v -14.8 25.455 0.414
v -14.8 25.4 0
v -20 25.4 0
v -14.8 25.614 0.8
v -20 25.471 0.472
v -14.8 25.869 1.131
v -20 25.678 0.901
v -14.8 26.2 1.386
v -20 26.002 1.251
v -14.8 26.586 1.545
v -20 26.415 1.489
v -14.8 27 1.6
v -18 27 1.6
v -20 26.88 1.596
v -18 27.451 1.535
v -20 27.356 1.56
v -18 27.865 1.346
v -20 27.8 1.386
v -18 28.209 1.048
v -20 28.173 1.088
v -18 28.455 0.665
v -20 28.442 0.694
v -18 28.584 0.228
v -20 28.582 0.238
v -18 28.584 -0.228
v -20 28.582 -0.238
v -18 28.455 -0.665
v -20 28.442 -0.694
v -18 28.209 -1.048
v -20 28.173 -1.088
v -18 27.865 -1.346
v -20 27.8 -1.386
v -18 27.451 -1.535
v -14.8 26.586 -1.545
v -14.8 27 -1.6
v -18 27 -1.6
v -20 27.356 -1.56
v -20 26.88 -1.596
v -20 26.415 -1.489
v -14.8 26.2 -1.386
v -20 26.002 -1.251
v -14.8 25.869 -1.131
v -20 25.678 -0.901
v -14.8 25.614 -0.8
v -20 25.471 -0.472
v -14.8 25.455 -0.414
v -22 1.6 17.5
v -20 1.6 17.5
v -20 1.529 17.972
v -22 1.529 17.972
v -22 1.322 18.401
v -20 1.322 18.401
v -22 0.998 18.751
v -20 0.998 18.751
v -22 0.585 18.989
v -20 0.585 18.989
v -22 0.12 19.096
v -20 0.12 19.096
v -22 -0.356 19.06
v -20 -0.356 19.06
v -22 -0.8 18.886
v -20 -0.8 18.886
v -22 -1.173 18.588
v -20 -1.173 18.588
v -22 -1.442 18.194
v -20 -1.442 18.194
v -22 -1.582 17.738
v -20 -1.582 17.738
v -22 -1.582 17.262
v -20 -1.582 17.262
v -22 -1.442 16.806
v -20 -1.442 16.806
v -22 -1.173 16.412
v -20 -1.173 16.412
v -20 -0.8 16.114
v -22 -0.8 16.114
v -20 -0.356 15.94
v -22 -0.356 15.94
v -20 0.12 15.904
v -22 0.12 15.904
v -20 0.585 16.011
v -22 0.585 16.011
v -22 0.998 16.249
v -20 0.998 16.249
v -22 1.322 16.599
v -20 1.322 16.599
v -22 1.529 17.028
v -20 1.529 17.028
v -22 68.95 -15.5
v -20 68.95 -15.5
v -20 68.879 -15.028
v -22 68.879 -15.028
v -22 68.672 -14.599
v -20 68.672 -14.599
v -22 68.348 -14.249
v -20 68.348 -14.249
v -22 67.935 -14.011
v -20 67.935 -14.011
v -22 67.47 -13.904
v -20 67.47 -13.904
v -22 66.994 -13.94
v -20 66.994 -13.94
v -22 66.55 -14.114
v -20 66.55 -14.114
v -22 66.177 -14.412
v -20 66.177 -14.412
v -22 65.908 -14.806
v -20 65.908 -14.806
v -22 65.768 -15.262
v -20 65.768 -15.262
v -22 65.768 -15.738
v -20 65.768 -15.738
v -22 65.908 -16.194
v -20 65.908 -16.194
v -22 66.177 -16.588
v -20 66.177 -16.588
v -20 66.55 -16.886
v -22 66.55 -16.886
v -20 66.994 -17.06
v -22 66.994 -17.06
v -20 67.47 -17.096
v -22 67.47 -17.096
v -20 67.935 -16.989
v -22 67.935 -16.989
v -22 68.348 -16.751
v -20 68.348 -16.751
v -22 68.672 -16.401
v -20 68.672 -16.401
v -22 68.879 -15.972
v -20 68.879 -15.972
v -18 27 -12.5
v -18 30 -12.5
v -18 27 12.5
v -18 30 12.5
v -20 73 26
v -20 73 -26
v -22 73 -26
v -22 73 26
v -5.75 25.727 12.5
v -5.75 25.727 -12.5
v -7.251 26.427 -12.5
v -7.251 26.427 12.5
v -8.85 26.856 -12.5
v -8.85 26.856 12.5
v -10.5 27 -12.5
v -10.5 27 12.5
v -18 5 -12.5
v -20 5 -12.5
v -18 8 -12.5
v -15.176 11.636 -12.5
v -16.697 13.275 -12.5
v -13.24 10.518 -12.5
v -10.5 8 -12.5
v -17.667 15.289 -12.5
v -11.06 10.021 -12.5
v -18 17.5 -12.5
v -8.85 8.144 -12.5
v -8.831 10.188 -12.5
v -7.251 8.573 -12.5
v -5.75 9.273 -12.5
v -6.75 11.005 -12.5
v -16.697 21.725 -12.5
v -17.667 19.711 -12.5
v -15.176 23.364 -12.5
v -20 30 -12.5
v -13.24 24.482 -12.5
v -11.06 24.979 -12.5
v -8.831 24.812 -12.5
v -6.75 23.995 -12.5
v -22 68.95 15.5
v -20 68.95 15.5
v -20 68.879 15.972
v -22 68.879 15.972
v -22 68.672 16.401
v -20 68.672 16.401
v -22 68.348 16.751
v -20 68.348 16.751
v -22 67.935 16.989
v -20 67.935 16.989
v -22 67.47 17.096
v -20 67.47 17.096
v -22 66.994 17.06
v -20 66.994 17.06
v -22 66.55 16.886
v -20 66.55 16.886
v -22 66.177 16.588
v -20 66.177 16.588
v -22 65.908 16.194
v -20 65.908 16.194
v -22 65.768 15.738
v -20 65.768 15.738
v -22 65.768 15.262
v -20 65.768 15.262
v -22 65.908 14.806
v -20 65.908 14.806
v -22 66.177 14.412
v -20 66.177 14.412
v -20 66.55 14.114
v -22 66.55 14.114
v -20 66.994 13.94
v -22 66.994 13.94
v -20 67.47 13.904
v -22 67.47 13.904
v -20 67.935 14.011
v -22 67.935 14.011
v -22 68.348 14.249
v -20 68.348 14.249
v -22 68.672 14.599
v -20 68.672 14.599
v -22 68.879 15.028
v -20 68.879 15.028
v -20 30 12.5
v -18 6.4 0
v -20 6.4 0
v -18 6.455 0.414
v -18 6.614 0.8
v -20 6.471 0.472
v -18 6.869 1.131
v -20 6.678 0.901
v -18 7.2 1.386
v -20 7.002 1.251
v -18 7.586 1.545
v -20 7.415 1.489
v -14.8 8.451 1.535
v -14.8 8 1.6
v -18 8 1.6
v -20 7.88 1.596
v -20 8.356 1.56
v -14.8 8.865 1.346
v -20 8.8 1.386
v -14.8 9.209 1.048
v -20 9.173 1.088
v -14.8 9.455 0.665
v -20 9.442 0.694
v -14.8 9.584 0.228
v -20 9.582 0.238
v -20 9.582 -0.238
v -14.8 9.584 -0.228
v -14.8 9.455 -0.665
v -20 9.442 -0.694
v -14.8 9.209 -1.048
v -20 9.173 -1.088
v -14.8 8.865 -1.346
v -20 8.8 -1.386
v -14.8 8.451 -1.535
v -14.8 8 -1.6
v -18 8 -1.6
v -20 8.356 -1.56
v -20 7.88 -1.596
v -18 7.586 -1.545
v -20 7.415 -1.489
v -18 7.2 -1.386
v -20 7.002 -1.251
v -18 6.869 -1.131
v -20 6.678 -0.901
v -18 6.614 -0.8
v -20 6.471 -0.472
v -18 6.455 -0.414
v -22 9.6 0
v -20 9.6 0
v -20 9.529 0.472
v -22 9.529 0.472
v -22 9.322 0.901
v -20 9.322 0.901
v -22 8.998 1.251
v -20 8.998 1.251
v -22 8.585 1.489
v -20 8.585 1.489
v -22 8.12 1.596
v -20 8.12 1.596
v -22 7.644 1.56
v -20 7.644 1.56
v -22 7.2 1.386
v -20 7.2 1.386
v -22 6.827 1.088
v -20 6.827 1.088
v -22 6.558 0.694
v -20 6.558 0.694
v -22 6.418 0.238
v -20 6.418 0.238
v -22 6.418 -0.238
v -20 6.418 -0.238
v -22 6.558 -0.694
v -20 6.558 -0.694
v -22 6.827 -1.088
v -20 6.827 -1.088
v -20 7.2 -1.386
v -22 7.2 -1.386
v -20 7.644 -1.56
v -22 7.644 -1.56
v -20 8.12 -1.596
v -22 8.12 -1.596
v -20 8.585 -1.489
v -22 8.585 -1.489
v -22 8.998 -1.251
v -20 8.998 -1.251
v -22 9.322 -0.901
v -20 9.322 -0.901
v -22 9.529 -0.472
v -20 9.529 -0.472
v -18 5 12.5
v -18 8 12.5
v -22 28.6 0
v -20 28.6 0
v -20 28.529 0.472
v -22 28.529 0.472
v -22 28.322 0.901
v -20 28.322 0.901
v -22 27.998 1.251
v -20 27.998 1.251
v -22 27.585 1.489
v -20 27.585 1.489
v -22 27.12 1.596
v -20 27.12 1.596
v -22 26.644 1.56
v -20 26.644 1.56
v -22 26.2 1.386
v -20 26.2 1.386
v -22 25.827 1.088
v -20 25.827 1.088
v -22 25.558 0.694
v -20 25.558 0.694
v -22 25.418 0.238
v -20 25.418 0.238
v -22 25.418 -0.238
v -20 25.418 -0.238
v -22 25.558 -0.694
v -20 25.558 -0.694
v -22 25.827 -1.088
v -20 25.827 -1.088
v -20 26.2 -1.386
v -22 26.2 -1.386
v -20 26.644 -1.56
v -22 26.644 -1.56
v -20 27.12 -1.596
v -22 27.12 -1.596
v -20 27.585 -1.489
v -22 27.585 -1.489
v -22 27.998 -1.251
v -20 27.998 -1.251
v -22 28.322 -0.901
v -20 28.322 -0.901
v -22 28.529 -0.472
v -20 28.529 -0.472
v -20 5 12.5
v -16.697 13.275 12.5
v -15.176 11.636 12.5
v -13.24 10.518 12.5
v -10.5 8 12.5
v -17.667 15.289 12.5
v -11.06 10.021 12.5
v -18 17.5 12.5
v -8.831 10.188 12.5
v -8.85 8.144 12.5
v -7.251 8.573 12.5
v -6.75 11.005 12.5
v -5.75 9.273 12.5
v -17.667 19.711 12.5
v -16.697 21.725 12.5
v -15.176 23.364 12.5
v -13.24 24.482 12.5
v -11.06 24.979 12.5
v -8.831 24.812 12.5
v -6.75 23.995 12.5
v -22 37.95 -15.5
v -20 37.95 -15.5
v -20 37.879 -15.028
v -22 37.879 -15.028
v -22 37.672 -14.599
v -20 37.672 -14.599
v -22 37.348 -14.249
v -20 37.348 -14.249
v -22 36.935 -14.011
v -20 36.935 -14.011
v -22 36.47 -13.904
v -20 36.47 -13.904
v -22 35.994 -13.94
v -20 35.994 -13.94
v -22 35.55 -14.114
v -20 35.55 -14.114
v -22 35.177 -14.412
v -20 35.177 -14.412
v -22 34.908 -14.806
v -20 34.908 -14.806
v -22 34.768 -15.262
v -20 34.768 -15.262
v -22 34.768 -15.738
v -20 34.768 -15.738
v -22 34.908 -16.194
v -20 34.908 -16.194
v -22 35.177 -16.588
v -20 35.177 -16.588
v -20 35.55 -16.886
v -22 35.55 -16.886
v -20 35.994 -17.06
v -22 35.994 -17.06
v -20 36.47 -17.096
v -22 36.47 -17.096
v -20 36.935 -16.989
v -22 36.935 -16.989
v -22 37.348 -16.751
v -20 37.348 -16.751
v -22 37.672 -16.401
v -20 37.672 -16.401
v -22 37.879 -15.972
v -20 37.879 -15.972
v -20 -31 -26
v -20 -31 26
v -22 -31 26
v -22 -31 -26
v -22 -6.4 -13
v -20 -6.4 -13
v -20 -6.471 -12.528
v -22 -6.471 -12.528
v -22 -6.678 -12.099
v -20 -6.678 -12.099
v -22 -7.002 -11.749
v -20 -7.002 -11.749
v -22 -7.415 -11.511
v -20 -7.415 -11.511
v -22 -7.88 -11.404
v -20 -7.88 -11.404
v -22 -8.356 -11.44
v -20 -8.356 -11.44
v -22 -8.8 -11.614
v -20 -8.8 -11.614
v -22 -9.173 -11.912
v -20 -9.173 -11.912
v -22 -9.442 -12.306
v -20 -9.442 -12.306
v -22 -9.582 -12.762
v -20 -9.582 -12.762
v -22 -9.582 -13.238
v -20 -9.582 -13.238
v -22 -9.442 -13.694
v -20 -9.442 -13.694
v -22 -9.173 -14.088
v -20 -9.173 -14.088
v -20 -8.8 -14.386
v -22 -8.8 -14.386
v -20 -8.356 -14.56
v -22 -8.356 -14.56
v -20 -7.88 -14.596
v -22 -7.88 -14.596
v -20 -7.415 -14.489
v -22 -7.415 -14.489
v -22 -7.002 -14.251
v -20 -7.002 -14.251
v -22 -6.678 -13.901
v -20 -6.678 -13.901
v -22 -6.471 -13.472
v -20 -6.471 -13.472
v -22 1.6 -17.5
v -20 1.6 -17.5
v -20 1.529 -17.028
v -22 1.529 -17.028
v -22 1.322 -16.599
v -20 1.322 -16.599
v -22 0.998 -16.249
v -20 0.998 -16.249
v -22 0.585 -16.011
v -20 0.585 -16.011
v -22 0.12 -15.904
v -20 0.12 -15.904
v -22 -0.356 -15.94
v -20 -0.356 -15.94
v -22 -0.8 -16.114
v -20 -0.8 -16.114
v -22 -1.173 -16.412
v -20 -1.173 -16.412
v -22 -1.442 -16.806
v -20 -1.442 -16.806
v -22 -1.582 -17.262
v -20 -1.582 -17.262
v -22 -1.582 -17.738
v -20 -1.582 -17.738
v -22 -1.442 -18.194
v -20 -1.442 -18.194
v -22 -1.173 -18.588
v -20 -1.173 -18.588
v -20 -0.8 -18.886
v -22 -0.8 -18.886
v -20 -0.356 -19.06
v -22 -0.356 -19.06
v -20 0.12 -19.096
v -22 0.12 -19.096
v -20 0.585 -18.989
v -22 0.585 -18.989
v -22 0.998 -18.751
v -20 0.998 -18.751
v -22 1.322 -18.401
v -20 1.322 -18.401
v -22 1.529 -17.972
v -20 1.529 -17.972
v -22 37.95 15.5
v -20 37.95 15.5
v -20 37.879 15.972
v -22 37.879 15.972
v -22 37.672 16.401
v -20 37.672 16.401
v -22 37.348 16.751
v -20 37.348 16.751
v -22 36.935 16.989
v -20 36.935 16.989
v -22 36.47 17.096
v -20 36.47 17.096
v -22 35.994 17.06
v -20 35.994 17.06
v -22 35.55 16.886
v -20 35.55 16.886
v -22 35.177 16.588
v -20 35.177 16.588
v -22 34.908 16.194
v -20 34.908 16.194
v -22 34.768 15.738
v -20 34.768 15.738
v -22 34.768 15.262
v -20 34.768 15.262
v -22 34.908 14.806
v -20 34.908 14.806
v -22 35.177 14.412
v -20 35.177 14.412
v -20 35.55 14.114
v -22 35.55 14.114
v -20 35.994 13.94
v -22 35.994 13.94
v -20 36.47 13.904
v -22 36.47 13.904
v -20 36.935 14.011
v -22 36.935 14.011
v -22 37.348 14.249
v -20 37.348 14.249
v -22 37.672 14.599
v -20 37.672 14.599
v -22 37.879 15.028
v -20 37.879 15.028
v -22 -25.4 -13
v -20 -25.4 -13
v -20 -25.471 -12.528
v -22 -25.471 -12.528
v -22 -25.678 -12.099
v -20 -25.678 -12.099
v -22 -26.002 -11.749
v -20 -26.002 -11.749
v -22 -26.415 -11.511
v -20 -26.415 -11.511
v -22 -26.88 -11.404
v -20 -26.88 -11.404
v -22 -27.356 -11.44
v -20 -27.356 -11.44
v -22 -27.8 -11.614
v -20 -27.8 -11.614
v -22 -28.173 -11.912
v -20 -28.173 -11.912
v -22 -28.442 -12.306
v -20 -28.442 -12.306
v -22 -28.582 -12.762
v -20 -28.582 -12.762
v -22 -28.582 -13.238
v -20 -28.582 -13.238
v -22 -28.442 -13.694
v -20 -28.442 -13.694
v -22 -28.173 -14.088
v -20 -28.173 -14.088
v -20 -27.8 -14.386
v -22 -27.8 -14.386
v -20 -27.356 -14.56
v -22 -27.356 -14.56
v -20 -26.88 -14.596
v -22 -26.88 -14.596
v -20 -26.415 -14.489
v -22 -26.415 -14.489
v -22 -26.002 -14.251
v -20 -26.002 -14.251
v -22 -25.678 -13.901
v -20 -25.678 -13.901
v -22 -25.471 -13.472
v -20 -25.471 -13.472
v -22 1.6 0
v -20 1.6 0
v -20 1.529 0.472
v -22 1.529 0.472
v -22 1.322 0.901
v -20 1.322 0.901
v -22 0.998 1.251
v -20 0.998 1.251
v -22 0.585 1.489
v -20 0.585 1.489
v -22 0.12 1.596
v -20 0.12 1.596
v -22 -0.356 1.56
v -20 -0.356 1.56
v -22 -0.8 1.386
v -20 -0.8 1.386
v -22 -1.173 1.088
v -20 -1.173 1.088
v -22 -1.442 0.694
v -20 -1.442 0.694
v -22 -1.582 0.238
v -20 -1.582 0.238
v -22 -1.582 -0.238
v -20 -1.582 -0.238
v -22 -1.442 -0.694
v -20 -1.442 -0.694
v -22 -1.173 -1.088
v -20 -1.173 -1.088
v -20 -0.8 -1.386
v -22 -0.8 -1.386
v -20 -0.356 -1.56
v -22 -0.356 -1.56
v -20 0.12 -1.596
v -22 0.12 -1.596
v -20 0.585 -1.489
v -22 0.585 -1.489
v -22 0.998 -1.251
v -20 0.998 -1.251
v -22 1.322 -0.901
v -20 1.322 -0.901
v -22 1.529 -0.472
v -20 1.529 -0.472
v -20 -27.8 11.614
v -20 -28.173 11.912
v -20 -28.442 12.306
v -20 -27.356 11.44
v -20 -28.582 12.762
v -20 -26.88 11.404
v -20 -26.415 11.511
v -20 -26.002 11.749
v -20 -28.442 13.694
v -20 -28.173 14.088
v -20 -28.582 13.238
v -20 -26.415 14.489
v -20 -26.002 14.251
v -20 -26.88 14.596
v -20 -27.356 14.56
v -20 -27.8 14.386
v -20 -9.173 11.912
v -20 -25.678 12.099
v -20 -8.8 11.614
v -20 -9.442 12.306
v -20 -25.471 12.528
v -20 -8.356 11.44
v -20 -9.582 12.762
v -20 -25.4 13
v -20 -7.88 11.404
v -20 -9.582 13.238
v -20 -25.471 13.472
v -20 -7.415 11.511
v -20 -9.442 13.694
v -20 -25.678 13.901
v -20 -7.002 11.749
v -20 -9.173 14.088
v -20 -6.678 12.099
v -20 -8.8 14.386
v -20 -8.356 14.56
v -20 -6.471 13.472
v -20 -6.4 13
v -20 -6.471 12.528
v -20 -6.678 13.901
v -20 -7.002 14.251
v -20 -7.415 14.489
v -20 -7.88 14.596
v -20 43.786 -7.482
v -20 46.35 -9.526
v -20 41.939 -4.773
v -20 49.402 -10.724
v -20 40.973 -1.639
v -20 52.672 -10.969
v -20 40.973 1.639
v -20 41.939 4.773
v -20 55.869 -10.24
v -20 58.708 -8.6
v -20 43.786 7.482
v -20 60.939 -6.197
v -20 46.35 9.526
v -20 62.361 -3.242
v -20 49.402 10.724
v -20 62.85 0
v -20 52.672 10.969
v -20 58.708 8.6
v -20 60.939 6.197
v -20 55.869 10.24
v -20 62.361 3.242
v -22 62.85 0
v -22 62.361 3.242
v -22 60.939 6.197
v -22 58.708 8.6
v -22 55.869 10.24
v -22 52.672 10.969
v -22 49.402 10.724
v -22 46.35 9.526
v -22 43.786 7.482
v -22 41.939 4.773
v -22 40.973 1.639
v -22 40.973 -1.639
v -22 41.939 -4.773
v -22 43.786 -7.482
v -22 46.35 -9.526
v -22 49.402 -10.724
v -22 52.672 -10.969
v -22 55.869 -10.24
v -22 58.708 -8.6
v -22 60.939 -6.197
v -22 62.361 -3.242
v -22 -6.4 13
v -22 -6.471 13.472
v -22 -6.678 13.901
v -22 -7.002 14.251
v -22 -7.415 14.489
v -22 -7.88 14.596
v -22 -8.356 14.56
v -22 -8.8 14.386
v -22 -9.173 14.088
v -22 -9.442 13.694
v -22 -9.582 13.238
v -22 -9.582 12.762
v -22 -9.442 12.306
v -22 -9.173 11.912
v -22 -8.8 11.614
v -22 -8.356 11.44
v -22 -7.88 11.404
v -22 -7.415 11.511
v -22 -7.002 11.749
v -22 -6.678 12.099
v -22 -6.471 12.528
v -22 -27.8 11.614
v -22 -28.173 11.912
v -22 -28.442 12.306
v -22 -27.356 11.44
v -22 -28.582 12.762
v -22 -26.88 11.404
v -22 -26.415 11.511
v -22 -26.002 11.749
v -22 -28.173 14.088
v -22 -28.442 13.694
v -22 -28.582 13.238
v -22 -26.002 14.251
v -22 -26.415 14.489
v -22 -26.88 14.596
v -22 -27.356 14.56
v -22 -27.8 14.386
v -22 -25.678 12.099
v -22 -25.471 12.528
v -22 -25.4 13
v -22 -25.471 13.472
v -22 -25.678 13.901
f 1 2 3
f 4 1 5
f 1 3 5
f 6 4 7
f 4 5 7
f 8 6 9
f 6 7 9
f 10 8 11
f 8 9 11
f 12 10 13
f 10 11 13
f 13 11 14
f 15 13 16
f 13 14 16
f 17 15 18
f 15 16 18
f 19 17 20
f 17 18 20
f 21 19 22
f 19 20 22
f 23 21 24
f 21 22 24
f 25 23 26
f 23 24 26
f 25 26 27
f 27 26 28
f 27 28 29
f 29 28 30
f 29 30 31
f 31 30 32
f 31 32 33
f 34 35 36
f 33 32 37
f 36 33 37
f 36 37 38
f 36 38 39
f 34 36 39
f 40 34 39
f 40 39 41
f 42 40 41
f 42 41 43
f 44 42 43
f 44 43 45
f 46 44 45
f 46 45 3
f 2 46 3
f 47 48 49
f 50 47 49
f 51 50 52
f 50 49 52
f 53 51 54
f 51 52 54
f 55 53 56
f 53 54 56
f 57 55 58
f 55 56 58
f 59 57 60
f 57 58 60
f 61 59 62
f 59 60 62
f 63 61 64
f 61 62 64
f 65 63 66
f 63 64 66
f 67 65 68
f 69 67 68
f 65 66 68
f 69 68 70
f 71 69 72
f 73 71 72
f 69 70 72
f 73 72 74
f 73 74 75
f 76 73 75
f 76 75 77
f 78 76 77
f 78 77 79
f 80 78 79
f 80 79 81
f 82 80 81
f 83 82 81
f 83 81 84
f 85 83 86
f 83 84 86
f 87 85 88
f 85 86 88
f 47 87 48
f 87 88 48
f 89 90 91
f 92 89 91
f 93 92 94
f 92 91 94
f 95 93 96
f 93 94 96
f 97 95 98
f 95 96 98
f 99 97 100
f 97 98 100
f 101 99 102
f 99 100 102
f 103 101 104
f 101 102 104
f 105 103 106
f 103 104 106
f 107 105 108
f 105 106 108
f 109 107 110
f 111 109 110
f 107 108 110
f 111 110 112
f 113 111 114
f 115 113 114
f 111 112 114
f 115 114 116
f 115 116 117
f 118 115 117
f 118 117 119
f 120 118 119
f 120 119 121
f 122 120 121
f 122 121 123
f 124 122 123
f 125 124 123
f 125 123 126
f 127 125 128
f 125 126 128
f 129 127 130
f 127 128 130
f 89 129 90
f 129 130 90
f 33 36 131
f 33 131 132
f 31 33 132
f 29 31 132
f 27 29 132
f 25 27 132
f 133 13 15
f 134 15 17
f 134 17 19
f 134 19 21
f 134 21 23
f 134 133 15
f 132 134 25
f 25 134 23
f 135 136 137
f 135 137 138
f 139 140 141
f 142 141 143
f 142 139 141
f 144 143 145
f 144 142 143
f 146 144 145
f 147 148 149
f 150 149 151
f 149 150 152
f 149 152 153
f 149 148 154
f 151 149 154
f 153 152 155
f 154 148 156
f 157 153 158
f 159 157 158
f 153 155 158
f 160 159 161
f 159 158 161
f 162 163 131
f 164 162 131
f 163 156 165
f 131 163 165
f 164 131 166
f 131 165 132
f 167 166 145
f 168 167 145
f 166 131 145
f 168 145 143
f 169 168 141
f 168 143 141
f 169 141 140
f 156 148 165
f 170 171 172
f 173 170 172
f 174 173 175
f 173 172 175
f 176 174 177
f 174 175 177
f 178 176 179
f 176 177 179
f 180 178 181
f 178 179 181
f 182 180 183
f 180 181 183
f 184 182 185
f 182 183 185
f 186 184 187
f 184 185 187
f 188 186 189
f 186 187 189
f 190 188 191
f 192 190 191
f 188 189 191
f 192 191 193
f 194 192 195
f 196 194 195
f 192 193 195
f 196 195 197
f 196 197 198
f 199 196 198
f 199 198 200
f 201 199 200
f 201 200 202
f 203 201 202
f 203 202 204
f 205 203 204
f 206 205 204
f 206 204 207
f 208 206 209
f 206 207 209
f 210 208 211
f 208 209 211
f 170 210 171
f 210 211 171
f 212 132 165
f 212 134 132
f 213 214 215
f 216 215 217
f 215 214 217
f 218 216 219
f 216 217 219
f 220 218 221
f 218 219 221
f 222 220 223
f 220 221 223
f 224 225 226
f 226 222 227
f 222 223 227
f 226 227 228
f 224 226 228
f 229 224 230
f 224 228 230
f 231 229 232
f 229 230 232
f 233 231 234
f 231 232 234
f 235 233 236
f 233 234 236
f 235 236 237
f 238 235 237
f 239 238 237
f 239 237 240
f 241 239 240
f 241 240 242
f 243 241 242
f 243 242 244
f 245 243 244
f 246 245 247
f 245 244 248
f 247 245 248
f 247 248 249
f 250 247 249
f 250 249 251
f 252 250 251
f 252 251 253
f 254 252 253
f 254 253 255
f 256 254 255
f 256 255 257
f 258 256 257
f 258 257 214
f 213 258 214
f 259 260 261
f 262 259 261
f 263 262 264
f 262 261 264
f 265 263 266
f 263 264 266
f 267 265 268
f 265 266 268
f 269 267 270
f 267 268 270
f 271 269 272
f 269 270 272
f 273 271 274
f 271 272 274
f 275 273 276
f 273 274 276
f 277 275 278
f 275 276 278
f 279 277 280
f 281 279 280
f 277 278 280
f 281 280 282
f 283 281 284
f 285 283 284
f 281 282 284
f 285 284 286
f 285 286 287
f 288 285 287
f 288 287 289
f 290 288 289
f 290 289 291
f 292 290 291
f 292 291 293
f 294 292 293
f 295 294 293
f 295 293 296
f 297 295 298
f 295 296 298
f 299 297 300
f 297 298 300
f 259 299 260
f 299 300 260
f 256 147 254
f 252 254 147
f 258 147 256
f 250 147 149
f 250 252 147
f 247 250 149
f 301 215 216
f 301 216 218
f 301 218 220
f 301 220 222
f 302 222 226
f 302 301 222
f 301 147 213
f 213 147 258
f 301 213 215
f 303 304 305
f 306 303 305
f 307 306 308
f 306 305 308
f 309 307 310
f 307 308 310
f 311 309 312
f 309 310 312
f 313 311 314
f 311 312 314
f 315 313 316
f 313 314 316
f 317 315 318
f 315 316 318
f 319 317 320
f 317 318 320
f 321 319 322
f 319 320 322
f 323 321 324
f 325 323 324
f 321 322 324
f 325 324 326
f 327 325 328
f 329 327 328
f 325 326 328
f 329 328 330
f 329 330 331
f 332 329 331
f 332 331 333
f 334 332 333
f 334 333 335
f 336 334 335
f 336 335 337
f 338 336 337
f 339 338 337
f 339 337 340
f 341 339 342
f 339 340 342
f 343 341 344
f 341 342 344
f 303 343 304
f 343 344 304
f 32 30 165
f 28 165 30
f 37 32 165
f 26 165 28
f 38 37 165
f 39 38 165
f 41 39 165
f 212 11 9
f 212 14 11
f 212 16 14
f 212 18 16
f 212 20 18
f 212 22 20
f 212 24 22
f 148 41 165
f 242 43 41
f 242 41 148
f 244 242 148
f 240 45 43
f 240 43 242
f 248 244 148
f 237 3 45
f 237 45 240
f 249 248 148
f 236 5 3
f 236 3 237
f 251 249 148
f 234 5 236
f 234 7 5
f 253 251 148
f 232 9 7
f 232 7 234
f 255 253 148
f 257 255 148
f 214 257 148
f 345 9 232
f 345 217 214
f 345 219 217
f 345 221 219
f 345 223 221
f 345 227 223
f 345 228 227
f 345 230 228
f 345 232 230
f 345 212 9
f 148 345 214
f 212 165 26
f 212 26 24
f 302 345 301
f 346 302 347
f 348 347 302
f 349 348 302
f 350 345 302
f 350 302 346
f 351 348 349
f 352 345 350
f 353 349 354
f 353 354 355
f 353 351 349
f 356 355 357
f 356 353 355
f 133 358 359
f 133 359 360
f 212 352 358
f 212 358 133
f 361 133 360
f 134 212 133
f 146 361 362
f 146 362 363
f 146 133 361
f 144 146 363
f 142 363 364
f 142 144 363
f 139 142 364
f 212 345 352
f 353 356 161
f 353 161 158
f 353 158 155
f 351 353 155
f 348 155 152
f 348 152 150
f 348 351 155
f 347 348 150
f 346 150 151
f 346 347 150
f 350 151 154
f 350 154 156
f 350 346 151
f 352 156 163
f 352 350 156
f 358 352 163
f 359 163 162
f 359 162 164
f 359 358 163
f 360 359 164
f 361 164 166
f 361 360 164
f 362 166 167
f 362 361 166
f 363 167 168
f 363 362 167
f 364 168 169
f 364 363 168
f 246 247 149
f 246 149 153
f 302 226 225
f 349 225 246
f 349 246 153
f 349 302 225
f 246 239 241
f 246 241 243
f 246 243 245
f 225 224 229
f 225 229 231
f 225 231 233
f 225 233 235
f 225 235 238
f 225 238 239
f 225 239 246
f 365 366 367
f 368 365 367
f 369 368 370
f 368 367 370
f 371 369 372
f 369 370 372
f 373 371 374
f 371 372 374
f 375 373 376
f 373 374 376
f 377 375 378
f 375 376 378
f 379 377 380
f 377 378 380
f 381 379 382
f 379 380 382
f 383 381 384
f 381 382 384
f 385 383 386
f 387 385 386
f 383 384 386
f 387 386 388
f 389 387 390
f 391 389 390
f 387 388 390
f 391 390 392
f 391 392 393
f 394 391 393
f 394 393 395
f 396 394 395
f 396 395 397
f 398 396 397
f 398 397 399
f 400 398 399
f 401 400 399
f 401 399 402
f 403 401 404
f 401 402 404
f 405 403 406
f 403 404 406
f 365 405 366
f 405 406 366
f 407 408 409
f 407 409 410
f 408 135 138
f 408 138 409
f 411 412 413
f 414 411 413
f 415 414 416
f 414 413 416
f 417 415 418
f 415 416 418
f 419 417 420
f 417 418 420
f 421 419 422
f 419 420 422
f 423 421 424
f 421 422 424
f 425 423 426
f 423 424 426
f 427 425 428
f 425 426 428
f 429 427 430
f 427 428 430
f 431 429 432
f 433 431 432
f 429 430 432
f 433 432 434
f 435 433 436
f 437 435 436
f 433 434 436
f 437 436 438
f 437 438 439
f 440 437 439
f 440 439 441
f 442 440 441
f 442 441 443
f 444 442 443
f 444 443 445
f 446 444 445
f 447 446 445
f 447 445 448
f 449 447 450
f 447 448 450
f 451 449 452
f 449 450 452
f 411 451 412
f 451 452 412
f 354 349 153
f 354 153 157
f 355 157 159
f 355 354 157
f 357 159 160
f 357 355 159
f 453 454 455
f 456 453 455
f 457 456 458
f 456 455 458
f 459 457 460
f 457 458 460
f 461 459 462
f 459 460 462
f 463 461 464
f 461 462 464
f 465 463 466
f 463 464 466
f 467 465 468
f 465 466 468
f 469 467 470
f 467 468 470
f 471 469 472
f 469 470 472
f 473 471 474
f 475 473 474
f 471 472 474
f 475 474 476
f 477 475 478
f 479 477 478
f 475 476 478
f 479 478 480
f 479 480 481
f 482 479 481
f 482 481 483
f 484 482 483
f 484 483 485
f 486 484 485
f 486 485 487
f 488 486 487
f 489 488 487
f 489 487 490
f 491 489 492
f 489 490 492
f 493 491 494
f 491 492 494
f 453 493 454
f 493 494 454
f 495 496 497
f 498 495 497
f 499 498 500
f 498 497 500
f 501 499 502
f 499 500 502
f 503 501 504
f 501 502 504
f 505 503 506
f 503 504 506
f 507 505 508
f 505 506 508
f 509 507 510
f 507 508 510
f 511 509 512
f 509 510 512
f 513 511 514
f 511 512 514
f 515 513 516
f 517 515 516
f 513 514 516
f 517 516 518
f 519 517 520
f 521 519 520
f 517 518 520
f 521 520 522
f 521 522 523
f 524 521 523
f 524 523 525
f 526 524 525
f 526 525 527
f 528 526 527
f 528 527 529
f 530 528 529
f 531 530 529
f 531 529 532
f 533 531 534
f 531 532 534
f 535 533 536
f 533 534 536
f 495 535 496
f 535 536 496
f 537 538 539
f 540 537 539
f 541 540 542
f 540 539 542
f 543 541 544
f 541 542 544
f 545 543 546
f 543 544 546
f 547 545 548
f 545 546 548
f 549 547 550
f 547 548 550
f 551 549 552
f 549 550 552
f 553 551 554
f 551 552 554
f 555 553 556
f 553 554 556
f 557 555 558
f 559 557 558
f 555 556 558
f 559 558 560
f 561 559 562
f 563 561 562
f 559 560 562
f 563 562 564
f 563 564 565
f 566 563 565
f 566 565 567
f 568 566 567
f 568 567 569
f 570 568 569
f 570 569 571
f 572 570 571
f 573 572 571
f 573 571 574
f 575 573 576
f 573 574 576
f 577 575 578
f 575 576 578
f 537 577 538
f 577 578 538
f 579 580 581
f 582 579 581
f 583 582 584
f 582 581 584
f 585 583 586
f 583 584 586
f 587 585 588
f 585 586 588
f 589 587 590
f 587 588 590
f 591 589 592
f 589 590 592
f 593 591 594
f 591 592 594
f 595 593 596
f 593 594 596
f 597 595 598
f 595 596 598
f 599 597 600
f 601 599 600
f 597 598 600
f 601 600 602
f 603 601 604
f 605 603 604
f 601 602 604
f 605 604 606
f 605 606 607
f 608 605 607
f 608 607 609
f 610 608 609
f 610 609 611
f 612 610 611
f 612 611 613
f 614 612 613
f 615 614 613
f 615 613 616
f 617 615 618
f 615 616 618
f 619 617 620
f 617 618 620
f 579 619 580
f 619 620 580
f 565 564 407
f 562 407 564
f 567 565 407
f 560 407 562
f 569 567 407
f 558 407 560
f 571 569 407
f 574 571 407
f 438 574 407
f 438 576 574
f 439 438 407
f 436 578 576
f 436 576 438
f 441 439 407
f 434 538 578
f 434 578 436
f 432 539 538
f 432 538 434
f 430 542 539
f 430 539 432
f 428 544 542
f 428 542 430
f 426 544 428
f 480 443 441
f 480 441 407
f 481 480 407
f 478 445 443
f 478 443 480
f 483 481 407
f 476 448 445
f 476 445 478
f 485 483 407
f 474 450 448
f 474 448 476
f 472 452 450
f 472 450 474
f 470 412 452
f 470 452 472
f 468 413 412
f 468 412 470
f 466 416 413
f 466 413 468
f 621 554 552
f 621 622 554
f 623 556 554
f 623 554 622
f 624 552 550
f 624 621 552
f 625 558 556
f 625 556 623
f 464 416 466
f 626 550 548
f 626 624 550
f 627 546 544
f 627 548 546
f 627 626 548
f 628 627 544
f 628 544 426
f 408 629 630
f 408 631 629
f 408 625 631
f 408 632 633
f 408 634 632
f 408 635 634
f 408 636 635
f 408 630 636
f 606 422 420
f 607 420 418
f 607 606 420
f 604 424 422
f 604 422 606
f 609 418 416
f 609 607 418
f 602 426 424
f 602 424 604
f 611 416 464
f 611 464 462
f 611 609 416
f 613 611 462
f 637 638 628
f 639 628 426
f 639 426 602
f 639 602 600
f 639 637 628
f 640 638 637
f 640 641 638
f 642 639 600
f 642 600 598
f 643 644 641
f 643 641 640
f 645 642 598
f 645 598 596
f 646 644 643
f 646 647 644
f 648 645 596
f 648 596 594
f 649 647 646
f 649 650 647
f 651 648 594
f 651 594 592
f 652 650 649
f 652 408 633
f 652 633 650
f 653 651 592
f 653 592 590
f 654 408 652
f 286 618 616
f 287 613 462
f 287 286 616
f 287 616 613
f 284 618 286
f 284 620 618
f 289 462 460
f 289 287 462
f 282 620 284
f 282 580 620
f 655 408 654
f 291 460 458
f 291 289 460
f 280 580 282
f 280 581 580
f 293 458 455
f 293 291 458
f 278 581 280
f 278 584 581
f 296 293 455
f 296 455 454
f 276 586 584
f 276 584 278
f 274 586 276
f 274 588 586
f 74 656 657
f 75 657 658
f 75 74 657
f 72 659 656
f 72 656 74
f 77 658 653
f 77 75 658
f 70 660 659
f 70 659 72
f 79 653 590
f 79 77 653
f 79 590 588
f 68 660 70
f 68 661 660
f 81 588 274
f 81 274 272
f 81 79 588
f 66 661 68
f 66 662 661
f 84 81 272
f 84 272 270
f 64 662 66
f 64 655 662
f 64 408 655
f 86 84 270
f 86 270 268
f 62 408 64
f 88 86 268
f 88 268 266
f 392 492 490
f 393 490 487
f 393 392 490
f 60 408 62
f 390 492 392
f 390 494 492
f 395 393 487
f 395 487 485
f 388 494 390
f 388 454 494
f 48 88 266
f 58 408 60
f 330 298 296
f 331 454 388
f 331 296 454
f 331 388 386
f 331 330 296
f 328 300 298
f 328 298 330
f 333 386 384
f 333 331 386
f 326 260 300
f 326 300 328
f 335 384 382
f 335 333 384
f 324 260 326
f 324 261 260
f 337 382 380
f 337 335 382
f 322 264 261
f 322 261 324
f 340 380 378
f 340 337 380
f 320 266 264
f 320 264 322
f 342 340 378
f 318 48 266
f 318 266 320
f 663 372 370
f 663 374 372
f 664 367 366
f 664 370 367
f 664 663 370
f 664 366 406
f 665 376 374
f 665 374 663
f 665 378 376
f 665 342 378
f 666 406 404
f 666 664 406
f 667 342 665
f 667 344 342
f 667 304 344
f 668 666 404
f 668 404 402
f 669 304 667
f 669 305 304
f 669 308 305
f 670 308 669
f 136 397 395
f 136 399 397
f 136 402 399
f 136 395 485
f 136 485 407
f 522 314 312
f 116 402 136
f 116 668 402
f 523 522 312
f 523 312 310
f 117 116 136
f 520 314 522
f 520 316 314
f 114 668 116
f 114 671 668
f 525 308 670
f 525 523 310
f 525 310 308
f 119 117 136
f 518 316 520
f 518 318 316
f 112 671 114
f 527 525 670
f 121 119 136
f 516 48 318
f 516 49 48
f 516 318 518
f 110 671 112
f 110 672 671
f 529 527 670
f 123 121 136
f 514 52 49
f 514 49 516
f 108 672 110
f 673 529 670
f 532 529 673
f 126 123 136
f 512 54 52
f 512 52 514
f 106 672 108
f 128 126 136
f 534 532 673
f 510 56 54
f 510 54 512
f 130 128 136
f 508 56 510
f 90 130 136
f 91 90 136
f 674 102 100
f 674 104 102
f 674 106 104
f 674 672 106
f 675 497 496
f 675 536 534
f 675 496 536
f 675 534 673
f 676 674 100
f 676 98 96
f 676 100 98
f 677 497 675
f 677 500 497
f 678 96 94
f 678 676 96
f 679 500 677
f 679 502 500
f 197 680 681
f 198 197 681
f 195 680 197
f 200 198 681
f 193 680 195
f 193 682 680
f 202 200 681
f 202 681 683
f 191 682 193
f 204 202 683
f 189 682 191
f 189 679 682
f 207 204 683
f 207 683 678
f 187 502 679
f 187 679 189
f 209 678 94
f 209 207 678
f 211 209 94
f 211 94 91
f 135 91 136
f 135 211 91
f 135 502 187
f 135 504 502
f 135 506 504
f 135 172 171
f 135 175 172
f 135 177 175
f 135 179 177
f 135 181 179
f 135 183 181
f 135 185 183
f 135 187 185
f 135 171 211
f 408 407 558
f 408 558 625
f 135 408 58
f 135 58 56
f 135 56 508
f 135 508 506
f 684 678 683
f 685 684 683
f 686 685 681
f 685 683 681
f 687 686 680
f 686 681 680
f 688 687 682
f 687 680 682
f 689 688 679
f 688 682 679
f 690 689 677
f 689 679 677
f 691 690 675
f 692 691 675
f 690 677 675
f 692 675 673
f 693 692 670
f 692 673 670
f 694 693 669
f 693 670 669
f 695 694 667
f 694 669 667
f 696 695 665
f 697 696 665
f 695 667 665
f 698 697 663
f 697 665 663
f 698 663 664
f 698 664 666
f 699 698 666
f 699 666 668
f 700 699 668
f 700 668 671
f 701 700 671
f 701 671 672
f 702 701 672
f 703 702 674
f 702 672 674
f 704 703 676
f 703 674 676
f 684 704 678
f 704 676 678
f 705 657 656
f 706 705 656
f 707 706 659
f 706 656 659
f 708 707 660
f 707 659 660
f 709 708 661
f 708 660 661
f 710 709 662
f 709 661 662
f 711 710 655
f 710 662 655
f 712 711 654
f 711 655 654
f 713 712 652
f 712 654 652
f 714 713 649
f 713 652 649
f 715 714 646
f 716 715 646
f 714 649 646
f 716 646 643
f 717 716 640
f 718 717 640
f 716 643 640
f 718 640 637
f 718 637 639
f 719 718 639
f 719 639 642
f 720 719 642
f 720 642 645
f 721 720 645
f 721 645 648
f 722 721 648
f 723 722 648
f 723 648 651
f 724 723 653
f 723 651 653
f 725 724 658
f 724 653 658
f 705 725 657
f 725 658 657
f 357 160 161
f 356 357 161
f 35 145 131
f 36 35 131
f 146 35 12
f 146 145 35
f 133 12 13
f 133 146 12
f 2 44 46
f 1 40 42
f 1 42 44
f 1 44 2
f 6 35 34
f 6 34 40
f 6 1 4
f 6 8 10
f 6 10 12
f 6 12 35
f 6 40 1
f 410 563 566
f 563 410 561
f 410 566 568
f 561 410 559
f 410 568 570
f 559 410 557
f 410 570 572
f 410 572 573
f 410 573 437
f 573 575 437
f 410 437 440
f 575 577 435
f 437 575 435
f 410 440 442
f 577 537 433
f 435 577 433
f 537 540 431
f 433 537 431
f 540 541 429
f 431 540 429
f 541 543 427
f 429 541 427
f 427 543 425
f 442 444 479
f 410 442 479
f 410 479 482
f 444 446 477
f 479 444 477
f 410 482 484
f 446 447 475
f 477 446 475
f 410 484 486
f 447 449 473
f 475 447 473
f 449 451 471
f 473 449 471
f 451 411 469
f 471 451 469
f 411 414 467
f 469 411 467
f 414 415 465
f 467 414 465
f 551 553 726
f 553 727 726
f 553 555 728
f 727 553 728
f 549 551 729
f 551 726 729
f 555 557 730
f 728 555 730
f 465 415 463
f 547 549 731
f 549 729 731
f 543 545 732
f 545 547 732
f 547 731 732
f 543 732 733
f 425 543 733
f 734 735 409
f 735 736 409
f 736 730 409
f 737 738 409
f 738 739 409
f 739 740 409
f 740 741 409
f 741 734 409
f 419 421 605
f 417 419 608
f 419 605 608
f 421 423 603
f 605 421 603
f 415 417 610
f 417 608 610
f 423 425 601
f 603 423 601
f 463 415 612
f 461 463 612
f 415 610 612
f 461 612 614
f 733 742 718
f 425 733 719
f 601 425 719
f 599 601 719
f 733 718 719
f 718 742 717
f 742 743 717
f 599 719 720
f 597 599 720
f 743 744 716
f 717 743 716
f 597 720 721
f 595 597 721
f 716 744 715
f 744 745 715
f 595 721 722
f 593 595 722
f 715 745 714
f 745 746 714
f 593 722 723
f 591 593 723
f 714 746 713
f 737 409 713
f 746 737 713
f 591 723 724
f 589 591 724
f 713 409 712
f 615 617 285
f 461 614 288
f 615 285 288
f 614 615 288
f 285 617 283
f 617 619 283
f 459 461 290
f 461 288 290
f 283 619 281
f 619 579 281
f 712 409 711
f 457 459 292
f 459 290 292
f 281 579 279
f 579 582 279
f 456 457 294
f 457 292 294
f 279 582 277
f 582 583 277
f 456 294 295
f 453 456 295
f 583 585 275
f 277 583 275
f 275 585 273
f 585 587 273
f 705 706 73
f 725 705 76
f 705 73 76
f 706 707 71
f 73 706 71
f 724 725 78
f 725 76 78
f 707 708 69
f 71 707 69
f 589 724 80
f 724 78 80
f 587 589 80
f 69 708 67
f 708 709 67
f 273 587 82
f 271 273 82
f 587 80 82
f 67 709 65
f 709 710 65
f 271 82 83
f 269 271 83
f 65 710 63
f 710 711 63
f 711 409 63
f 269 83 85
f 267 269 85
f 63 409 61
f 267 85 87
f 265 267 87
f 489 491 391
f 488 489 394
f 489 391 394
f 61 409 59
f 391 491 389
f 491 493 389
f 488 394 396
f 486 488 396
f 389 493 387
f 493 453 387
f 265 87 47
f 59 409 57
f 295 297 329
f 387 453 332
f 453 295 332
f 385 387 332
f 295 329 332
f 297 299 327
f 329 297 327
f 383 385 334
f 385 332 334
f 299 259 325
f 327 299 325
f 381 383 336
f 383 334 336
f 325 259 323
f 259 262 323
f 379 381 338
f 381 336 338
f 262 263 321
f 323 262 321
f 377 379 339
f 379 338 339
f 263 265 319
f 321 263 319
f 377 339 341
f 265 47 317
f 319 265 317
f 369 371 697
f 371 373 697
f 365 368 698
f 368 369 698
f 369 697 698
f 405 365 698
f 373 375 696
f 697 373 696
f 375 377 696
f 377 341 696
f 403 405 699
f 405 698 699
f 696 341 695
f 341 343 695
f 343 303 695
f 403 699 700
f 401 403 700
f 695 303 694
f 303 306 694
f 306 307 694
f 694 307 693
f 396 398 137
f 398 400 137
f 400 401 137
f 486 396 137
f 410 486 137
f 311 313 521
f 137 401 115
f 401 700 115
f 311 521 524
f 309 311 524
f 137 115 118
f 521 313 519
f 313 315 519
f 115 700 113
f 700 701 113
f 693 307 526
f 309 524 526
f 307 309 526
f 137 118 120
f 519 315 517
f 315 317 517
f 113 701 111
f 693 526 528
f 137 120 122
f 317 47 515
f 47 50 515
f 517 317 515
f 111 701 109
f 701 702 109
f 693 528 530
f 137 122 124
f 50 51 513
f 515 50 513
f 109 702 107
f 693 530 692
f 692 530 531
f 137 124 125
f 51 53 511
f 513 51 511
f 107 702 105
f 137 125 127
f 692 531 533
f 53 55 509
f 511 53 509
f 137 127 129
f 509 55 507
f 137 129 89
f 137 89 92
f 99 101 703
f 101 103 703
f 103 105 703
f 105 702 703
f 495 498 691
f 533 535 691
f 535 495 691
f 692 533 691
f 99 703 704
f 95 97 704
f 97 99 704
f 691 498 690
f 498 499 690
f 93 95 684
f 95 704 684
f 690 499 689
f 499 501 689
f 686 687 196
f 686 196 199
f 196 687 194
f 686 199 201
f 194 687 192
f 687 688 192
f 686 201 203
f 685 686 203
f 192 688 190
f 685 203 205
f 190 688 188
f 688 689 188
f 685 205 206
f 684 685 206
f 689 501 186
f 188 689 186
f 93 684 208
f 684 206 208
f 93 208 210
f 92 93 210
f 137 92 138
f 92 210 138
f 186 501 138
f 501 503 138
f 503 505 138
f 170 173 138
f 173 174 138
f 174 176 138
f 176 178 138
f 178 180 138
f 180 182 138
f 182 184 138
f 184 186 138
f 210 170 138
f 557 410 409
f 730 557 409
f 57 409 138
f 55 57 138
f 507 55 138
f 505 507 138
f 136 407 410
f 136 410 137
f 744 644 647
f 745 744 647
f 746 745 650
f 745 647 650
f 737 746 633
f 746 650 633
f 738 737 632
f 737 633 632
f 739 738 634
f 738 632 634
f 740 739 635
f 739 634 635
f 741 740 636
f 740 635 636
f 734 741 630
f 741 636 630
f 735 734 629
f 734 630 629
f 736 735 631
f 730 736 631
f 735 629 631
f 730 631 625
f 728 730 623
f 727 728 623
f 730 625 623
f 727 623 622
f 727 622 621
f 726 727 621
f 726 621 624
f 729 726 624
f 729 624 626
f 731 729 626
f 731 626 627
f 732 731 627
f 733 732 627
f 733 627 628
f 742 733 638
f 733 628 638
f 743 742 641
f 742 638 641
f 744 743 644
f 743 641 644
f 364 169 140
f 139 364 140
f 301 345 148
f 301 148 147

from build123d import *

# Parameters (mm, degrees)
F5_DEPTH = 12.5
F6_R     = 1.6
F7_DEPTH = 5.2
F4_R     = 1.6
F4_R_2   = 11
F8_DEPTH = 2


with BuildPart() as f5:
    # F1 (on Top) → F5 (new body, symmetric)
    with BuildSketch(Plane.XY):
        with BuildLine():
            Line((-20, 30), (-20, 17.5))
            Line((-20, 17.5), (-20, 5))
            Line((-20, 5), (-18, 5))
            Line((-18, 5), (-18, 8))
            Line((-18, 8), (-10.5, 8))
            ThreePointArc((-10.5, 8), (-8.0412190715, 8.3237046503), (-5.75, 9.272758664))
            Line((-5.75, 9.272758664), (-6.75, 11.0048094716))
            ThreePointArc((-6.75, 11.0048094716), (-14.25, 11.0048094716), (-18, 17.5))
            ThreePointArc((-18, 17.5), (-14.25, 23.9951905284), (-6.75, 23.9951905284))
            Line((-6.75, 23.9951905284), (-5.75, 25.727241336))
            ThreePointArc((-5.75, 25.727241336), (-8.0412190715, 26.6762953497), (-10.5, 27))
            Line((-10.5, 27), (-18, 27))
            Line((-18, 27), (-18, 30))
            Line((-18, 30), (-20, 30))
        make_face()
    extrude(amount=F5_DEPTH, both=True)

    # F6 (on face) → F7 (cut)
    with BuildSketch(Plane(origin=(-20, 0, 0), x_dir=(0, -1, 0), z_dir=(-1, 0, 0))):
        with Locations((-27, 0)):
            Circle(F6_R)
        with Locations((-8, 0)):
            Circle(F6_R)
    extrude(amount=-F7_DEPTH, mode=Mode.SUBTRACT)


with BuildPart() as f8:
    # F4 (on line) → F8 (new body)
    with BuildSketch(Plane.YZ.offset(-20)):
        Polygon((30, 26), (-30, 26), (-31, 26), (-31, -26), (-30, -26), (30, -26), (73, -26), (73, 26), align=None)
        with Locations((0, -17.5)):
            Circle(F4_R, mode=Mode.SUBTRACT)
        with Locations((-27, -13)):
            Circle(F4_R, mode=Mode.SUBTRACT)
        with Locations((-8, -13)):
            Circle(F4_R, mode=Mode.SUBTRACT)
        with Locations((36.35, -15.5)):
            Circle(F4_R, mode=Mode.SUBTRACT)
        with Locations((67.35, -15.5)):
            Circle(F4_R, mode=Mode.SUBTRACT)
        Circle(F4_R, mode=Mode.SUBTRACT)
        with Locations((8, 0)):
            Circle(F4_R, mode=Mode.SUBTRACT)
        with Locations((-27, 13)):
            Circle(F4_R, mode=Mode.SUBTRACT)
        with Locations((-8, 13)):
            Circle(F4_R, mode=Mode.SUBTRACT)
        with Locations((0, 17.5)):
            Circle(F4_R, mode=Mode.SUBTRACT)
        with Locations((27, 0)):
            Circle(F4_R, mode=Mode.SUBTRACT)
        with Locations((51.85, 0)):
            Circle(F4_R_2, mode=Mode.SUBTRACT)
        with Locations((36.35, 15.5)):
            Circle(F4_R, mode=Mode.SUBTRACT)
        with Locations((67.35, 15.5)):
            Circle(F4_R, mode=Mode.SUBTRACT)
    extrude(amount=-F8_DEPTH)


solid = Compound([f5.part, f8.part])
